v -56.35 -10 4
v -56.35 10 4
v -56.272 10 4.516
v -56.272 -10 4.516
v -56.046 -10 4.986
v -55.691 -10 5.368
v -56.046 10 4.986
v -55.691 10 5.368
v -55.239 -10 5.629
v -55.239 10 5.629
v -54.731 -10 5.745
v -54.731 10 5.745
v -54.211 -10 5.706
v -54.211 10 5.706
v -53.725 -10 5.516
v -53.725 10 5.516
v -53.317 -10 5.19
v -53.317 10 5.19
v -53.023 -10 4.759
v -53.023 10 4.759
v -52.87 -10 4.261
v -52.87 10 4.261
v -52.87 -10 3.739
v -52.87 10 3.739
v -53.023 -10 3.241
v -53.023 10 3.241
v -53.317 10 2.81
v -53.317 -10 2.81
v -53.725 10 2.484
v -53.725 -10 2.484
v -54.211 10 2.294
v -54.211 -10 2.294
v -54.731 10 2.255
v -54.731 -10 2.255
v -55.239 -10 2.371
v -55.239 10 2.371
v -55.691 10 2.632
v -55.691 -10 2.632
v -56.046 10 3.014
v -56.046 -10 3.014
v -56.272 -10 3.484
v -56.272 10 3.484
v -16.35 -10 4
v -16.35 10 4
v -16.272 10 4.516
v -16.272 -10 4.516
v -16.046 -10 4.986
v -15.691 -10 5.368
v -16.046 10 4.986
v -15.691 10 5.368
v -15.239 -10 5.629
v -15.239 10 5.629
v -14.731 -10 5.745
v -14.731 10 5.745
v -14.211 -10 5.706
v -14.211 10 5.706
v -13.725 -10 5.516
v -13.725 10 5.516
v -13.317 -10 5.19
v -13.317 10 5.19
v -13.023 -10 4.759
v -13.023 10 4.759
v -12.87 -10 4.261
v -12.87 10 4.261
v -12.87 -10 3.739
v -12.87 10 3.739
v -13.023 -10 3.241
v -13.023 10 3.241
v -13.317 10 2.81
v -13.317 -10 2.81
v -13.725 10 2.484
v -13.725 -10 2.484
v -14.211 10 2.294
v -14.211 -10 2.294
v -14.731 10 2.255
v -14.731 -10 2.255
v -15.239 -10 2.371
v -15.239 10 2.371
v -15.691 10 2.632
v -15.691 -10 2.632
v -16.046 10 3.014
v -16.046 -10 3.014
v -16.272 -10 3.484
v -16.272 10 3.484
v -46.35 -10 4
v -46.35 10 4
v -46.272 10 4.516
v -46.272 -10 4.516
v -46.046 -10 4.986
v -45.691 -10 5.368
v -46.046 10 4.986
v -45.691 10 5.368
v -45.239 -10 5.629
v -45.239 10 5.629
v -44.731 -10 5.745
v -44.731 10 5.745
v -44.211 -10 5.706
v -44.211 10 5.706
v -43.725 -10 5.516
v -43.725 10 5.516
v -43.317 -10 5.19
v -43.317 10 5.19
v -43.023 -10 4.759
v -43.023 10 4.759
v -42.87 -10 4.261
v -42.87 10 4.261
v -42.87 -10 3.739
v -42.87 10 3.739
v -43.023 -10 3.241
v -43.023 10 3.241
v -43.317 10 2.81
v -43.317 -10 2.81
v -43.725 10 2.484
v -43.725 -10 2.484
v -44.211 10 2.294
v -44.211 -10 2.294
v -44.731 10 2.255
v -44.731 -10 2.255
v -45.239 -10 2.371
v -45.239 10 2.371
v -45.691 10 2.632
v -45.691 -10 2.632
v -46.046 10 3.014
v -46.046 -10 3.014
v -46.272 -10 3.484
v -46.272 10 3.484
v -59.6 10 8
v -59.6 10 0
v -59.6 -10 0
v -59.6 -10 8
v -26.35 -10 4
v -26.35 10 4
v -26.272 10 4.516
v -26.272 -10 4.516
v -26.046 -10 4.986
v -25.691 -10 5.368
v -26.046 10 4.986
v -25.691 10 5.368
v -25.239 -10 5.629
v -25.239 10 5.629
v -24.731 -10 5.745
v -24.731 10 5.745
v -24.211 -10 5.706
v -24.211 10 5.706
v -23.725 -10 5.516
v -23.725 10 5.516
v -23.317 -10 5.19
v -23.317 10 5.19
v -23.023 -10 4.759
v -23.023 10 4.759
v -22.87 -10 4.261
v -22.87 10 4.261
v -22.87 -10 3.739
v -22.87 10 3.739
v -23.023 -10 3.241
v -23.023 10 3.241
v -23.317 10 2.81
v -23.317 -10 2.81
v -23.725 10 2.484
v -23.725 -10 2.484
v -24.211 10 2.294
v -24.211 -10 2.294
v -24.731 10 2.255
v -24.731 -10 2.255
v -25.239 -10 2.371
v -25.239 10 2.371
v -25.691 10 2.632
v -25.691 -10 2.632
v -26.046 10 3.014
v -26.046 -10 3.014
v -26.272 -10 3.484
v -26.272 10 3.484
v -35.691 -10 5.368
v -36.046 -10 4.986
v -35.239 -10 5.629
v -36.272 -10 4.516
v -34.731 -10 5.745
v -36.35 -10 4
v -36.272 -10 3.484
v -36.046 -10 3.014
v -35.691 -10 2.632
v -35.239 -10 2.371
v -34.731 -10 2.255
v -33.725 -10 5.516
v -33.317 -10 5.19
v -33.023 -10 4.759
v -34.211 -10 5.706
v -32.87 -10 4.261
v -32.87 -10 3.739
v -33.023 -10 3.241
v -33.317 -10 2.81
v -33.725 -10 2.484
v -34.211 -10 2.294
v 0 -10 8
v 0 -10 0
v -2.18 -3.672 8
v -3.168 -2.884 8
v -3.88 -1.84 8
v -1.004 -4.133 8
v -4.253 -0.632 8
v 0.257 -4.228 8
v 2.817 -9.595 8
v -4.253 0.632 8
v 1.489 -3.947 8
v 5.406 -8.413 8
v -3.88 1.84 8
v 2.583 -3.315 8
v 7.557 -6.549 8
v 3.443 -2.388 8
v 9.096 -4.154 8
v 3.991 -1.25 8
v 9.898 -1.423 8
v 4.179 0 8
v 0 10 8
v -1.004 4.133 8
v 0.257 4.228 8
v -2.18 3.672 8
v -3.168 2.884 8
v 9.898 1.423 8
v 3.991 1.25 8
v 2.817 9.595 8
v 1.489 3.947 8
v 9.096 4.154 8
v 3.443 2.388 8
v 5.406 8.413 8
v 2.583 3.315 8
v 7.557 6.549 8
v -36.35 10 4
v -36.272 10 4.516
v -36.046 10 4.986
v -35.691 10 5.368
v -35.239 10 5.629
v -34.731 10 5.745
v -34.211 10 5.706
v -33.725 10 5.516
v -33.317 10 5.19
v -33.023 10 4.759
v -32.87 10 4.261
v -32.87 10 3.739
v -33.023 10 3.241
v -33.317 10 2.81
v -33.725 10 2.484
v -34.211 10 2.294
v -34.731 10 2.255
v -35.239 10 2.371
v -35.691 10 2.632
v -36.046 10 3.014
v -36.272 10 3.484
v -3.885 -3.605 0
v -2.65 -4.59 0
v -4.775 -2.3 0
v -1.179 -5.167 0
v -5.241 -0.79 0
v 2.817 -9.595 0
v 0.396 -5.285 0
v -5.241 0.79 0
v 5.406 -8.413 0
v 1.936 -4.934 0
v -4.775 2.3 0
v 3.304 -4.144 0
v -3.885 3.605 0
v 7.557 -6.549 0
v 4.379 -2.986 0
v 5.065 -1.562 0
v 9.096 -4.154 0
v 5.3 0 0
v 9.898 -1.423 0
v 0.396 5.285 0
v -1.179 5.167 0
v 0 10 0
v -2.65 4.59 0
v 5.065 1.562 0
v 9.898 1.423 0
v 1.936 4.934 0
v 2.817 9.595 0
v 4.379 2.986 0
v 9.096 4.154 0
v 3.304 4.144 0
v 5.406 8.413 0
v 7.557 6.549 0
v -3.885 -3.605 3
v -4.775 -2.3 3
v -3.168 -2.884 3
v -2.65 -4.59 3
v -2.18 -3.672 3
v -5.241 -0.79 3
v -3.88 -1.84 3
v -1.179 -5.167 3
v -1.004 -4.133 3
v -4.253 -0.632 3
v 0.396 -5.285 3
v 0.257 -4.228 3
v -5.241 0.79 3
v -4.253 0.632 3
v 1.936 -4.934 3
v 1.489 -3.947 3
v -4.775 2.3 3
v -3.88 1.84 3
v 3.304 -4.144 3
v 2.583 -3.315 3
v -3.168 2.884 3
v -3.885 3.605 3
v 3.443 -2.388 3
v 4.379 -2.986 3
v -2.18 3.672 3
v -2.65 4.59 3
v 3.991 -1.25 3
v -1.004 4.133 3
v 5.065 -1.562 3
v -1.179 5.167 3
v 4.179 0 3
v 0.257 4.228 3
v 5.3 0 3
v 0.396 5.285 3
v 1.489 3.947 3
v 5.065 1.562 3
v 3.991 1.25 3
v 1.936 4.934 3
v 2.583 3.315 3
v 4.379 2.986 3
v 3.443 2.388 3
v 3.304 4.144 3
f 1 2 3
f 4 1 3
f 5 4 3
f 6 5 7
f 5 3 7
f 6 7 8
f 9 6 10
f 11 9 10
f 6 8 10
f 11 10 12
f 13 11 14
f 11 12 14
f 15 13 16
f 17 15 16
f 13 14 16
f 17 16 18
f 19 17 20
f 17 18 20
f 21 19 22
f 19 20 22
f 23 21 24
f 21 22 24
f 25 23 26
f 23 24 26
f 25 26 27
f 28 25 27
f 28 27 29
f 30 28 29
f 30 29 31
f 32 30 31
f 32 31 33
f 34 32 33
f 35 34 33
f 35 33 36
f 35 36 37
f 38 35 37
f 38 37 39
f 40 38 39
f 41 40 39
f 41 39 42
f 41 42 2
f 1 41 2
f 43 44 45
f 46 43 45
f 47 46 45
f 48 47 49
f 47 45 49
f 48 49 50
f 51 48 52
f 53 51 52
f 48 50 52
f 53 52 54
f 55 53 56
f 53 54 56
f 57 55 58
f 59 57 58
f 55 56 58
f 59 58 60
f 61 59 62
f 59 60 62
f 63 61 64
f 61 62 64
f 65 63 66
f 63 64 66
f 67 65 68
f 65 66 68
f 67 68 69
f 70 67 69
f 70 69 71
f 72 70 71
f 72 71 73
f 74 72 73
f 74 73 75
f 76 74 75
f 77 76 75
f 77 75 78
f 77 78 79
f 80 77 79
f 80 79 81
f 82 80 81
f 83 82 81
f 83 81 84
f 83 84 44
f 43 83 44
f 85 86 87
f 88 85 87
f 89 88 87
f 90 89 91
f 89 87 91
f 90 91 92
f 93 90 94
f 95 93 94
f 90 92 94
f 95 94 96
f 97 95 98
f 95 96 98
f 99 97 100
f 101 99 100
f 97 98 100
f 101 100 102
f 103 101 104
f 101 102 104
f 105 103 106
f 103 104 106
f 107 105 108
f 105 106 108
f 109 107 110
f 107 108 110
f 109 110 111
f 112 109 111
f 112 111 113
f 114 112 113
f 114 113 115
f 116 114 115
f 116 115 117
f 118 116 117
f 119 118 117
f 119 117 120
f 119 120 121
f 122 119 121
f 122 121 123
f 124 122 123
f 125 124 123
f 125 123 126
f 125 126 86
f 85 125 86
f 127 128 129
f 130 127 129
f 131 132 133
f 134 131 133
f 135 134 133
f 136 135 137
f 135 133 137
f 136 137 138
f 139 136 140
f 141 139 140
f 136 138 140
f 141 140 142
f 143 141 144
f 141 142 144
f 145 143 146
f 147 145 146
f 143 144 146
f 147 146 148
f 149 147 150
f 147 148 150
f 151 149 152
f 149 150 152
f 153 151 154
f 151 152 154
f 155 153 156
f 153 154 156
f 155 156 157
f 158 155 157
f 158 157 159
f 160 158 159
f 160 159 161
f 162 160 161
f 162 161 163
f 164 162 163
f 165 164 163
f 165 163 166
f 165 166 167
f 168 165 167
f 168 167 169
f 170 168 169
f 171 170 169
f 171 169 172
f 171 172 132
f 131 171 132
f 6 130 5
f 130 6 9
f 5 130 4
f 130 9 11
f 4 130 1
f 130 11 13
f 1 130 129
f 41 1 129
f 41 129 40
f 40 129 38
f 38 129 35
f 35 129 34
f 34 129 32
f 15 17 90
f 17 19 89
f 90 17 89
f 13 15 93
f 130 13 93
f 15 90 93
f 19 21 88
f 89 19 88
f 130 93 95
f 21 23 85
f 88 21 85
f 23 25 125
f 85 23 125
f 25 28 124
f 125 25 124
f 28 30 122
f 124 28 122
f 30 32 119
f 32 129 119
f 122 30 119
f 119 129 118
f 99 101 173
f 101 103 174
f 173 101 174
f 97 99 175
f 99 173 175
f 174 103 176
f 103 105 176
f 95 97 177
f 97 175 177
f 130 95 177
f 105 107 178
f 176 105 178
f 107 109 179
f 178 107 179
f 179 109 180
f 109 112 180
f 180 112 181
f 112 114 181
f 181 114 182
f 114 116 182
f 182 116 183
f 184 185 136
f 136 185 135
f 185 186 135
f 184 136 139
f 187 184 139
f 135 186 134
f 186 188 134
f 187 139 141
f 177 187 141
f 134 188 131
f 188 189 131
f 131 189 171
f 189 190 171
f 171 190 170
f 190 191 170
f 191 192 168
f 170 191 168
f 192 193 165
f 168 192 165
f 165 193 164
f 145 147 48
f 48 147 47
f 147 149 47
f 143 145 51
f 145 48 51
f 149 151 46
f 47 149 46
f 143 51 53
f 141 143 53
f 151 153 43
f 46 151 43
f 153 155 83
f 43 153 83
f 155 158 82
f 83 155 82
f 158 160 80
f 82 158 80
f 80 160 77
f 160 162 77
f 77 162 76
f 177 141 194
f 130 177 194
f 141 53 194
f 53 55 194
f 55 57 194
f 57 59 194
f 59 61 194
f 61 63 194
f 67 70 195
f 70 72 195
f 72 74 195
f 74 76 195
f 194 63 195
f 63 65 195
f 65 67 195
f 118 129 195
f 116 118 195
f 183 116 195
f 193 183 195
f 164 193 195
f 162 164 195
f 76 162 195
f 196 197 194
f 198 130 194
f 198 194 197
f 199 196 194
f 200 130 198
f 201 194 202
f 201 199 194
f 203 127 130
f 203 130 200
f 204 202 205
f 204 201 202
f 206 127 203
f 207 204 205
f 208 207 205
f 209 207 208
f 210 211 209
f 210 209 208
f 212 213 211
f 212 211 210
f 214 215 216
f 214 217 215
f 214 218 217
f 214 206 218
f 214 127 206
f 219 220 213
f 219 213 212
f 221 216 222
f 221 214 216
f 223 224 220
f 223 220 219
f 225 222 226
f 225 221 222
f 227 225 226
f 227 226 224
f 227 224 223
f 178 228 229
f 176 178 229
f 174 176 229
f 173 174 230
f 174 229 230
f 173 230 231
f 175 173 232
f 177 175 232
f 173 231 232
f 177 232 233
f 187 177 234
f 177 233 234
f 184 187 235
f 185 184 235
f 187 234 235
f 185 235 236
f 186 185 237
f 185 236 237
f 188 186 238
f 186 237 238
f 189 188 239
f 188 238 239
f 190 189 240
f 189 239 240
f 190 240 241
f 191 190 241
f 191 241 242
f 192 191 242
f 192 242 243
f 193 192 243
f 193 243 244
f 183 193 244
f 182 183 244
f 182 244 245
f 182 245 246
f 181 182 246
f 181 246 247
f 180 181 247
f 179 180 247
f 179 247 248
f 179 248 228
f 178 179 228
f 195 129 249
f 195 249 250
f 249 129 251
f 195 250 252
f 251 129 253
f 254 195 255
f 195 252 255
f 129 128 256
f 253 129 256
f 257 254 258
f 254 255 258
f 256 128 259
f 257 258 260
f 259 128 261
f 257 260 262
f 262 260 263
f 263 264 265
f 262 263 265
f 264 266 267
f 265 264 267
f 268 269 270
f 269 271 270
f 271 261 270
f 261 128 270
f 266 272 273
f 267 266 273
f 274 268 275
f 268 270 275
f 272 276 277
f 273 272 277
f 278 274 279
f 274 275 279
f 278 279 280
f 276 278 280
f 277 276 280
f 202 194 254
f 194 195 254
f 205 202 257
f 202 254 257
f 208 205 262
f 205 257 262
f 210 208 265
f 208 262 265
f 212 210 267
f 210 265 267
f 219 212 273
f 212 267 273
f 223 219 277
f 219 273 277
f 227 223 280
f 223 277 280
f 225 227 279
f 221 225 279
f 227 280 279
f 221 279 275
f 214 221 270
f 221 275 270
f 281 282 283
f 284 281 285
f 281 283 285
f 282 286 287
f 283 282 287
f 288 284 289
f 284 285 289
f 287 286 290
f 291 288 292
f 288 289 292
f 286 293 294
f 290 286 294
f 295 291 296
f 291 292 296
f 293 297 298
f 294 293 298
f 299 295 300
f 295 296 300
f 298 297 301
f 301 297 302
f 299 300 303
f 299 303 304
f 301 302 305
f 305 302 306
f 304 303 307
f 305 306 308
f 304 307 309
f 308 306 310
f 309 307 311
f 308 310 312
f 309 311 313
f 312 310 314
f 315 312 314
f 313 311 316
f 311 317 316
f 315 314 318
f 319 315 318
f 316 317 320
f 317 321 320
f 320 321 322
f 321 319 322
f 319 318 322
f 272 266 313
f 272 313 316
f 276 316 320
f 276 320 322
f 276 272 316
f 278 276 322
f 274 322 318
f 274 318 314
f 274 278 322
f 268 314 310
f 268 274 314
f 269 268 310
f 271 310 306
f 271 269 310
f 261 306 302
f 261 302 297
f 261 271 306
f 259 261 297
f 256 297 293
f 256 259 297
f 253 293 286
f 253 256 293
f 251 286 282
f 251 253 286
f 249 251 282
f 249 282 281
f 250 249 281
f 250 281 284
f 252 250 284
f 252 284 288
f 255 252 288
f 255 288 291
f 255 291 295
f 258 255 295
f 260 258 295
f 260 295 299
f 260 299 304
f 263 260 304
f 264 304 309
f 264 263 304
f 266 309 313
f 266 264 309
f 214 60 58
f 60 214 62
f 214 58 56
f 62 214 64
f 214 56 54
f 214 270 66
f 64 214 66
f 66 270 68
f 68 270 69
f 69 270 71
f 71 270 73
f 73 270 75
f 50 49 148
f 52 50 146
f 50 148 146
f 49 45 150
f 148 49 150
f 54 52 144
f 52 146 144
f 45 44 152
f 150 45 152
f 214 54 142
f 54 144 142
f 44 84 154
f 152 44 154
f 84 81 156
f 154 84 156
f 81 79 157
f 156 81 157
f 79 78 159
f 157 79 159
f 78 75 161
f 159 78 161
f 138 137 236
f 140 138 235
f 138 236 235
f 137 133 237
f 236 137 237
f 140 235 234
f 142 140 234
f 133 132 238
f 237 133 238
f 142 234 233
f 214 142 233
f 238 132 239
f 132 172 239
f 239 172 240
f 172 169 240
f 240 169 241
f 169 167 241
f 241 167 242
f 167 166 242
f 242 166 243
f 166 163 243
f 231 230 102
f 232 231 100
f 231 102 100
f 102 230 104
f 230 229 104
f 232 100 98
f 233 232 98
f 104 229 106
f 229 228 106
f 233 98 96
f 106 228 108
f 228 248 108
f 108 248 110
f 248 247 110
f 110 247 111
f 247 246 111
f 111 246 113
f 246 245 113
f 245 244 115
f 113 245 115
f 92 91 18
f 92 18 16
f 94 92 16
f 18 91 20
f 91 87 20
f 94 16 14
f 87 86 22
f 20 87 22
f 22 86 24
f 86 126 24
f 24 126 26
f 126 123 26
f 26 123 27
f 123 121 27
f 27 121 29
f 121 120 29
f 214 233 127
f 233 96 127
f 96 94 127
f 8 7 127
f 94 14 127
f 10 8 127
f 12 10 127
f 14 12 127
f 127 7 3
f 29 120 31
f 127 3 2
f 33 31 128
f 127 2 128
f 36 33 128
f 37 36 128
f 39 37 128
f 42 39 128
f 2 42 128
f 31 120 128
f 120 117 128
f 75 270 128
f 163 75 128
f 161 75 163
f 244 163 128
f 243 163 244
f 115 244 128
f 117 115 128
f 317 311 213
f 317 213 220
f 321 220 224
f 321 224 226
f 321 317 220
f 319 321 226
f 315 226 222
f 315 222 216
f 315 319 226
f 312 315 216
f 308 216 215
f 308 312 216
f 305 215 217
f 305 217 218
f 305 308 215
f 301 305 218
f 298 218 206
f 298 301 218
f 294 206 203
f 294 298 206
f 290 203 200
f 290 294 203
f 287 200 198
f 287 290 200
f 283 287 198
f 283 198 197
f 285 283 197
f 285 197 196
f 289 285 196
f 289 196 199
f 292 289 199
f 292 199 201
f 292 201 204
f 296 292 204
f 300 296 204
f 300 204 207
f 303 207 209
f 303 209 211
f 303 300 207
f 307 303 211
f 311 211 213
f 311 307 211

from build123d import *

# Parameters (mm, degrees)
ESQUISSE1_R             = 5.3
BOSS_EXTRU_1_DEPTH      = 3
ESQUISSE2_R             = 4.239698474
BOSS_EXTRU_2_DEPTH      = 5
ESQUISSE3_R             = 1.75
ENL_V_MAT_EXTRU_1_DEPTH = 64.373180447


with BuildPart() as part:
    # Esquisse1 → Boss.-Extru.1 (new body)
    with BuildSketch(Plane.XY):
        with BuildLine():
            Line((0, 10), (-59.6, 10))
            Line((-59.6, 10), (-59.6, -10))
            Line((-59.6, -10), (0, -10))
            ThreePointArc((0, -10), (10, 0), (0, 10))
        make_face()
        Circle(ESQUISSE1_R, mode=Mode.SUBTRACT)
    extrude(amount=BOSS_EXTRU_1_DEPTH)

    # Esquisse2 → Boss.-Extru.2 (add)
    with BuildSketch(Plane.XY.offset(3)):
        with BuildLine():
            Line((-59.6, 10), (-59.6, -10))
            Line((-59.6, -10), (0, -10))
            ThreePointArc((0, -10), (10, 0), (0, 10))
            Line((0, 10), (-59.6, 10))
        make_face()
        with Locations((-0.060301526, 0)):
            Circle(ESQUISSE2_R, mode=Mode.SUBTRACT)
    extrude(amount=BOSS_EXTRU_2_DEPTH)

    # Esquisse3 → Enlèv. mat.-Extru.1 (cut, through all)
    with BuildSketch(Plane(origin=(0, 10, 0), x_dir=(1, 0, 0), z_dir=(0, 1, 0))):
        with Locations(Location((-54.6, -4, 0), (0, 0, 180))):
            Circle(ESQUISSE3_R)
        with Locations(Location((-44.6, -4, 0), (0, 0, 180))):
            Circle(ESQUISSE3_R)
        with Locations(Location((-34.6, -4, 0), (0, 0, 180))):
            Circle(ESQUISSE3_R)
        with Locations(Location((-24.6, -4, 0), (0, 0, 180))):
            Circle(ESQUISSE3_R)
        with Locations(Location((-14.6, -4, 0), (0, 0, 180))):
            Circle(ESQUISSE3_R)
    extrude(amount=-ENL_V_MAT_EXTRU_1_DEPTH, mode=Mode.SUBTRACT)


solid = part.part
